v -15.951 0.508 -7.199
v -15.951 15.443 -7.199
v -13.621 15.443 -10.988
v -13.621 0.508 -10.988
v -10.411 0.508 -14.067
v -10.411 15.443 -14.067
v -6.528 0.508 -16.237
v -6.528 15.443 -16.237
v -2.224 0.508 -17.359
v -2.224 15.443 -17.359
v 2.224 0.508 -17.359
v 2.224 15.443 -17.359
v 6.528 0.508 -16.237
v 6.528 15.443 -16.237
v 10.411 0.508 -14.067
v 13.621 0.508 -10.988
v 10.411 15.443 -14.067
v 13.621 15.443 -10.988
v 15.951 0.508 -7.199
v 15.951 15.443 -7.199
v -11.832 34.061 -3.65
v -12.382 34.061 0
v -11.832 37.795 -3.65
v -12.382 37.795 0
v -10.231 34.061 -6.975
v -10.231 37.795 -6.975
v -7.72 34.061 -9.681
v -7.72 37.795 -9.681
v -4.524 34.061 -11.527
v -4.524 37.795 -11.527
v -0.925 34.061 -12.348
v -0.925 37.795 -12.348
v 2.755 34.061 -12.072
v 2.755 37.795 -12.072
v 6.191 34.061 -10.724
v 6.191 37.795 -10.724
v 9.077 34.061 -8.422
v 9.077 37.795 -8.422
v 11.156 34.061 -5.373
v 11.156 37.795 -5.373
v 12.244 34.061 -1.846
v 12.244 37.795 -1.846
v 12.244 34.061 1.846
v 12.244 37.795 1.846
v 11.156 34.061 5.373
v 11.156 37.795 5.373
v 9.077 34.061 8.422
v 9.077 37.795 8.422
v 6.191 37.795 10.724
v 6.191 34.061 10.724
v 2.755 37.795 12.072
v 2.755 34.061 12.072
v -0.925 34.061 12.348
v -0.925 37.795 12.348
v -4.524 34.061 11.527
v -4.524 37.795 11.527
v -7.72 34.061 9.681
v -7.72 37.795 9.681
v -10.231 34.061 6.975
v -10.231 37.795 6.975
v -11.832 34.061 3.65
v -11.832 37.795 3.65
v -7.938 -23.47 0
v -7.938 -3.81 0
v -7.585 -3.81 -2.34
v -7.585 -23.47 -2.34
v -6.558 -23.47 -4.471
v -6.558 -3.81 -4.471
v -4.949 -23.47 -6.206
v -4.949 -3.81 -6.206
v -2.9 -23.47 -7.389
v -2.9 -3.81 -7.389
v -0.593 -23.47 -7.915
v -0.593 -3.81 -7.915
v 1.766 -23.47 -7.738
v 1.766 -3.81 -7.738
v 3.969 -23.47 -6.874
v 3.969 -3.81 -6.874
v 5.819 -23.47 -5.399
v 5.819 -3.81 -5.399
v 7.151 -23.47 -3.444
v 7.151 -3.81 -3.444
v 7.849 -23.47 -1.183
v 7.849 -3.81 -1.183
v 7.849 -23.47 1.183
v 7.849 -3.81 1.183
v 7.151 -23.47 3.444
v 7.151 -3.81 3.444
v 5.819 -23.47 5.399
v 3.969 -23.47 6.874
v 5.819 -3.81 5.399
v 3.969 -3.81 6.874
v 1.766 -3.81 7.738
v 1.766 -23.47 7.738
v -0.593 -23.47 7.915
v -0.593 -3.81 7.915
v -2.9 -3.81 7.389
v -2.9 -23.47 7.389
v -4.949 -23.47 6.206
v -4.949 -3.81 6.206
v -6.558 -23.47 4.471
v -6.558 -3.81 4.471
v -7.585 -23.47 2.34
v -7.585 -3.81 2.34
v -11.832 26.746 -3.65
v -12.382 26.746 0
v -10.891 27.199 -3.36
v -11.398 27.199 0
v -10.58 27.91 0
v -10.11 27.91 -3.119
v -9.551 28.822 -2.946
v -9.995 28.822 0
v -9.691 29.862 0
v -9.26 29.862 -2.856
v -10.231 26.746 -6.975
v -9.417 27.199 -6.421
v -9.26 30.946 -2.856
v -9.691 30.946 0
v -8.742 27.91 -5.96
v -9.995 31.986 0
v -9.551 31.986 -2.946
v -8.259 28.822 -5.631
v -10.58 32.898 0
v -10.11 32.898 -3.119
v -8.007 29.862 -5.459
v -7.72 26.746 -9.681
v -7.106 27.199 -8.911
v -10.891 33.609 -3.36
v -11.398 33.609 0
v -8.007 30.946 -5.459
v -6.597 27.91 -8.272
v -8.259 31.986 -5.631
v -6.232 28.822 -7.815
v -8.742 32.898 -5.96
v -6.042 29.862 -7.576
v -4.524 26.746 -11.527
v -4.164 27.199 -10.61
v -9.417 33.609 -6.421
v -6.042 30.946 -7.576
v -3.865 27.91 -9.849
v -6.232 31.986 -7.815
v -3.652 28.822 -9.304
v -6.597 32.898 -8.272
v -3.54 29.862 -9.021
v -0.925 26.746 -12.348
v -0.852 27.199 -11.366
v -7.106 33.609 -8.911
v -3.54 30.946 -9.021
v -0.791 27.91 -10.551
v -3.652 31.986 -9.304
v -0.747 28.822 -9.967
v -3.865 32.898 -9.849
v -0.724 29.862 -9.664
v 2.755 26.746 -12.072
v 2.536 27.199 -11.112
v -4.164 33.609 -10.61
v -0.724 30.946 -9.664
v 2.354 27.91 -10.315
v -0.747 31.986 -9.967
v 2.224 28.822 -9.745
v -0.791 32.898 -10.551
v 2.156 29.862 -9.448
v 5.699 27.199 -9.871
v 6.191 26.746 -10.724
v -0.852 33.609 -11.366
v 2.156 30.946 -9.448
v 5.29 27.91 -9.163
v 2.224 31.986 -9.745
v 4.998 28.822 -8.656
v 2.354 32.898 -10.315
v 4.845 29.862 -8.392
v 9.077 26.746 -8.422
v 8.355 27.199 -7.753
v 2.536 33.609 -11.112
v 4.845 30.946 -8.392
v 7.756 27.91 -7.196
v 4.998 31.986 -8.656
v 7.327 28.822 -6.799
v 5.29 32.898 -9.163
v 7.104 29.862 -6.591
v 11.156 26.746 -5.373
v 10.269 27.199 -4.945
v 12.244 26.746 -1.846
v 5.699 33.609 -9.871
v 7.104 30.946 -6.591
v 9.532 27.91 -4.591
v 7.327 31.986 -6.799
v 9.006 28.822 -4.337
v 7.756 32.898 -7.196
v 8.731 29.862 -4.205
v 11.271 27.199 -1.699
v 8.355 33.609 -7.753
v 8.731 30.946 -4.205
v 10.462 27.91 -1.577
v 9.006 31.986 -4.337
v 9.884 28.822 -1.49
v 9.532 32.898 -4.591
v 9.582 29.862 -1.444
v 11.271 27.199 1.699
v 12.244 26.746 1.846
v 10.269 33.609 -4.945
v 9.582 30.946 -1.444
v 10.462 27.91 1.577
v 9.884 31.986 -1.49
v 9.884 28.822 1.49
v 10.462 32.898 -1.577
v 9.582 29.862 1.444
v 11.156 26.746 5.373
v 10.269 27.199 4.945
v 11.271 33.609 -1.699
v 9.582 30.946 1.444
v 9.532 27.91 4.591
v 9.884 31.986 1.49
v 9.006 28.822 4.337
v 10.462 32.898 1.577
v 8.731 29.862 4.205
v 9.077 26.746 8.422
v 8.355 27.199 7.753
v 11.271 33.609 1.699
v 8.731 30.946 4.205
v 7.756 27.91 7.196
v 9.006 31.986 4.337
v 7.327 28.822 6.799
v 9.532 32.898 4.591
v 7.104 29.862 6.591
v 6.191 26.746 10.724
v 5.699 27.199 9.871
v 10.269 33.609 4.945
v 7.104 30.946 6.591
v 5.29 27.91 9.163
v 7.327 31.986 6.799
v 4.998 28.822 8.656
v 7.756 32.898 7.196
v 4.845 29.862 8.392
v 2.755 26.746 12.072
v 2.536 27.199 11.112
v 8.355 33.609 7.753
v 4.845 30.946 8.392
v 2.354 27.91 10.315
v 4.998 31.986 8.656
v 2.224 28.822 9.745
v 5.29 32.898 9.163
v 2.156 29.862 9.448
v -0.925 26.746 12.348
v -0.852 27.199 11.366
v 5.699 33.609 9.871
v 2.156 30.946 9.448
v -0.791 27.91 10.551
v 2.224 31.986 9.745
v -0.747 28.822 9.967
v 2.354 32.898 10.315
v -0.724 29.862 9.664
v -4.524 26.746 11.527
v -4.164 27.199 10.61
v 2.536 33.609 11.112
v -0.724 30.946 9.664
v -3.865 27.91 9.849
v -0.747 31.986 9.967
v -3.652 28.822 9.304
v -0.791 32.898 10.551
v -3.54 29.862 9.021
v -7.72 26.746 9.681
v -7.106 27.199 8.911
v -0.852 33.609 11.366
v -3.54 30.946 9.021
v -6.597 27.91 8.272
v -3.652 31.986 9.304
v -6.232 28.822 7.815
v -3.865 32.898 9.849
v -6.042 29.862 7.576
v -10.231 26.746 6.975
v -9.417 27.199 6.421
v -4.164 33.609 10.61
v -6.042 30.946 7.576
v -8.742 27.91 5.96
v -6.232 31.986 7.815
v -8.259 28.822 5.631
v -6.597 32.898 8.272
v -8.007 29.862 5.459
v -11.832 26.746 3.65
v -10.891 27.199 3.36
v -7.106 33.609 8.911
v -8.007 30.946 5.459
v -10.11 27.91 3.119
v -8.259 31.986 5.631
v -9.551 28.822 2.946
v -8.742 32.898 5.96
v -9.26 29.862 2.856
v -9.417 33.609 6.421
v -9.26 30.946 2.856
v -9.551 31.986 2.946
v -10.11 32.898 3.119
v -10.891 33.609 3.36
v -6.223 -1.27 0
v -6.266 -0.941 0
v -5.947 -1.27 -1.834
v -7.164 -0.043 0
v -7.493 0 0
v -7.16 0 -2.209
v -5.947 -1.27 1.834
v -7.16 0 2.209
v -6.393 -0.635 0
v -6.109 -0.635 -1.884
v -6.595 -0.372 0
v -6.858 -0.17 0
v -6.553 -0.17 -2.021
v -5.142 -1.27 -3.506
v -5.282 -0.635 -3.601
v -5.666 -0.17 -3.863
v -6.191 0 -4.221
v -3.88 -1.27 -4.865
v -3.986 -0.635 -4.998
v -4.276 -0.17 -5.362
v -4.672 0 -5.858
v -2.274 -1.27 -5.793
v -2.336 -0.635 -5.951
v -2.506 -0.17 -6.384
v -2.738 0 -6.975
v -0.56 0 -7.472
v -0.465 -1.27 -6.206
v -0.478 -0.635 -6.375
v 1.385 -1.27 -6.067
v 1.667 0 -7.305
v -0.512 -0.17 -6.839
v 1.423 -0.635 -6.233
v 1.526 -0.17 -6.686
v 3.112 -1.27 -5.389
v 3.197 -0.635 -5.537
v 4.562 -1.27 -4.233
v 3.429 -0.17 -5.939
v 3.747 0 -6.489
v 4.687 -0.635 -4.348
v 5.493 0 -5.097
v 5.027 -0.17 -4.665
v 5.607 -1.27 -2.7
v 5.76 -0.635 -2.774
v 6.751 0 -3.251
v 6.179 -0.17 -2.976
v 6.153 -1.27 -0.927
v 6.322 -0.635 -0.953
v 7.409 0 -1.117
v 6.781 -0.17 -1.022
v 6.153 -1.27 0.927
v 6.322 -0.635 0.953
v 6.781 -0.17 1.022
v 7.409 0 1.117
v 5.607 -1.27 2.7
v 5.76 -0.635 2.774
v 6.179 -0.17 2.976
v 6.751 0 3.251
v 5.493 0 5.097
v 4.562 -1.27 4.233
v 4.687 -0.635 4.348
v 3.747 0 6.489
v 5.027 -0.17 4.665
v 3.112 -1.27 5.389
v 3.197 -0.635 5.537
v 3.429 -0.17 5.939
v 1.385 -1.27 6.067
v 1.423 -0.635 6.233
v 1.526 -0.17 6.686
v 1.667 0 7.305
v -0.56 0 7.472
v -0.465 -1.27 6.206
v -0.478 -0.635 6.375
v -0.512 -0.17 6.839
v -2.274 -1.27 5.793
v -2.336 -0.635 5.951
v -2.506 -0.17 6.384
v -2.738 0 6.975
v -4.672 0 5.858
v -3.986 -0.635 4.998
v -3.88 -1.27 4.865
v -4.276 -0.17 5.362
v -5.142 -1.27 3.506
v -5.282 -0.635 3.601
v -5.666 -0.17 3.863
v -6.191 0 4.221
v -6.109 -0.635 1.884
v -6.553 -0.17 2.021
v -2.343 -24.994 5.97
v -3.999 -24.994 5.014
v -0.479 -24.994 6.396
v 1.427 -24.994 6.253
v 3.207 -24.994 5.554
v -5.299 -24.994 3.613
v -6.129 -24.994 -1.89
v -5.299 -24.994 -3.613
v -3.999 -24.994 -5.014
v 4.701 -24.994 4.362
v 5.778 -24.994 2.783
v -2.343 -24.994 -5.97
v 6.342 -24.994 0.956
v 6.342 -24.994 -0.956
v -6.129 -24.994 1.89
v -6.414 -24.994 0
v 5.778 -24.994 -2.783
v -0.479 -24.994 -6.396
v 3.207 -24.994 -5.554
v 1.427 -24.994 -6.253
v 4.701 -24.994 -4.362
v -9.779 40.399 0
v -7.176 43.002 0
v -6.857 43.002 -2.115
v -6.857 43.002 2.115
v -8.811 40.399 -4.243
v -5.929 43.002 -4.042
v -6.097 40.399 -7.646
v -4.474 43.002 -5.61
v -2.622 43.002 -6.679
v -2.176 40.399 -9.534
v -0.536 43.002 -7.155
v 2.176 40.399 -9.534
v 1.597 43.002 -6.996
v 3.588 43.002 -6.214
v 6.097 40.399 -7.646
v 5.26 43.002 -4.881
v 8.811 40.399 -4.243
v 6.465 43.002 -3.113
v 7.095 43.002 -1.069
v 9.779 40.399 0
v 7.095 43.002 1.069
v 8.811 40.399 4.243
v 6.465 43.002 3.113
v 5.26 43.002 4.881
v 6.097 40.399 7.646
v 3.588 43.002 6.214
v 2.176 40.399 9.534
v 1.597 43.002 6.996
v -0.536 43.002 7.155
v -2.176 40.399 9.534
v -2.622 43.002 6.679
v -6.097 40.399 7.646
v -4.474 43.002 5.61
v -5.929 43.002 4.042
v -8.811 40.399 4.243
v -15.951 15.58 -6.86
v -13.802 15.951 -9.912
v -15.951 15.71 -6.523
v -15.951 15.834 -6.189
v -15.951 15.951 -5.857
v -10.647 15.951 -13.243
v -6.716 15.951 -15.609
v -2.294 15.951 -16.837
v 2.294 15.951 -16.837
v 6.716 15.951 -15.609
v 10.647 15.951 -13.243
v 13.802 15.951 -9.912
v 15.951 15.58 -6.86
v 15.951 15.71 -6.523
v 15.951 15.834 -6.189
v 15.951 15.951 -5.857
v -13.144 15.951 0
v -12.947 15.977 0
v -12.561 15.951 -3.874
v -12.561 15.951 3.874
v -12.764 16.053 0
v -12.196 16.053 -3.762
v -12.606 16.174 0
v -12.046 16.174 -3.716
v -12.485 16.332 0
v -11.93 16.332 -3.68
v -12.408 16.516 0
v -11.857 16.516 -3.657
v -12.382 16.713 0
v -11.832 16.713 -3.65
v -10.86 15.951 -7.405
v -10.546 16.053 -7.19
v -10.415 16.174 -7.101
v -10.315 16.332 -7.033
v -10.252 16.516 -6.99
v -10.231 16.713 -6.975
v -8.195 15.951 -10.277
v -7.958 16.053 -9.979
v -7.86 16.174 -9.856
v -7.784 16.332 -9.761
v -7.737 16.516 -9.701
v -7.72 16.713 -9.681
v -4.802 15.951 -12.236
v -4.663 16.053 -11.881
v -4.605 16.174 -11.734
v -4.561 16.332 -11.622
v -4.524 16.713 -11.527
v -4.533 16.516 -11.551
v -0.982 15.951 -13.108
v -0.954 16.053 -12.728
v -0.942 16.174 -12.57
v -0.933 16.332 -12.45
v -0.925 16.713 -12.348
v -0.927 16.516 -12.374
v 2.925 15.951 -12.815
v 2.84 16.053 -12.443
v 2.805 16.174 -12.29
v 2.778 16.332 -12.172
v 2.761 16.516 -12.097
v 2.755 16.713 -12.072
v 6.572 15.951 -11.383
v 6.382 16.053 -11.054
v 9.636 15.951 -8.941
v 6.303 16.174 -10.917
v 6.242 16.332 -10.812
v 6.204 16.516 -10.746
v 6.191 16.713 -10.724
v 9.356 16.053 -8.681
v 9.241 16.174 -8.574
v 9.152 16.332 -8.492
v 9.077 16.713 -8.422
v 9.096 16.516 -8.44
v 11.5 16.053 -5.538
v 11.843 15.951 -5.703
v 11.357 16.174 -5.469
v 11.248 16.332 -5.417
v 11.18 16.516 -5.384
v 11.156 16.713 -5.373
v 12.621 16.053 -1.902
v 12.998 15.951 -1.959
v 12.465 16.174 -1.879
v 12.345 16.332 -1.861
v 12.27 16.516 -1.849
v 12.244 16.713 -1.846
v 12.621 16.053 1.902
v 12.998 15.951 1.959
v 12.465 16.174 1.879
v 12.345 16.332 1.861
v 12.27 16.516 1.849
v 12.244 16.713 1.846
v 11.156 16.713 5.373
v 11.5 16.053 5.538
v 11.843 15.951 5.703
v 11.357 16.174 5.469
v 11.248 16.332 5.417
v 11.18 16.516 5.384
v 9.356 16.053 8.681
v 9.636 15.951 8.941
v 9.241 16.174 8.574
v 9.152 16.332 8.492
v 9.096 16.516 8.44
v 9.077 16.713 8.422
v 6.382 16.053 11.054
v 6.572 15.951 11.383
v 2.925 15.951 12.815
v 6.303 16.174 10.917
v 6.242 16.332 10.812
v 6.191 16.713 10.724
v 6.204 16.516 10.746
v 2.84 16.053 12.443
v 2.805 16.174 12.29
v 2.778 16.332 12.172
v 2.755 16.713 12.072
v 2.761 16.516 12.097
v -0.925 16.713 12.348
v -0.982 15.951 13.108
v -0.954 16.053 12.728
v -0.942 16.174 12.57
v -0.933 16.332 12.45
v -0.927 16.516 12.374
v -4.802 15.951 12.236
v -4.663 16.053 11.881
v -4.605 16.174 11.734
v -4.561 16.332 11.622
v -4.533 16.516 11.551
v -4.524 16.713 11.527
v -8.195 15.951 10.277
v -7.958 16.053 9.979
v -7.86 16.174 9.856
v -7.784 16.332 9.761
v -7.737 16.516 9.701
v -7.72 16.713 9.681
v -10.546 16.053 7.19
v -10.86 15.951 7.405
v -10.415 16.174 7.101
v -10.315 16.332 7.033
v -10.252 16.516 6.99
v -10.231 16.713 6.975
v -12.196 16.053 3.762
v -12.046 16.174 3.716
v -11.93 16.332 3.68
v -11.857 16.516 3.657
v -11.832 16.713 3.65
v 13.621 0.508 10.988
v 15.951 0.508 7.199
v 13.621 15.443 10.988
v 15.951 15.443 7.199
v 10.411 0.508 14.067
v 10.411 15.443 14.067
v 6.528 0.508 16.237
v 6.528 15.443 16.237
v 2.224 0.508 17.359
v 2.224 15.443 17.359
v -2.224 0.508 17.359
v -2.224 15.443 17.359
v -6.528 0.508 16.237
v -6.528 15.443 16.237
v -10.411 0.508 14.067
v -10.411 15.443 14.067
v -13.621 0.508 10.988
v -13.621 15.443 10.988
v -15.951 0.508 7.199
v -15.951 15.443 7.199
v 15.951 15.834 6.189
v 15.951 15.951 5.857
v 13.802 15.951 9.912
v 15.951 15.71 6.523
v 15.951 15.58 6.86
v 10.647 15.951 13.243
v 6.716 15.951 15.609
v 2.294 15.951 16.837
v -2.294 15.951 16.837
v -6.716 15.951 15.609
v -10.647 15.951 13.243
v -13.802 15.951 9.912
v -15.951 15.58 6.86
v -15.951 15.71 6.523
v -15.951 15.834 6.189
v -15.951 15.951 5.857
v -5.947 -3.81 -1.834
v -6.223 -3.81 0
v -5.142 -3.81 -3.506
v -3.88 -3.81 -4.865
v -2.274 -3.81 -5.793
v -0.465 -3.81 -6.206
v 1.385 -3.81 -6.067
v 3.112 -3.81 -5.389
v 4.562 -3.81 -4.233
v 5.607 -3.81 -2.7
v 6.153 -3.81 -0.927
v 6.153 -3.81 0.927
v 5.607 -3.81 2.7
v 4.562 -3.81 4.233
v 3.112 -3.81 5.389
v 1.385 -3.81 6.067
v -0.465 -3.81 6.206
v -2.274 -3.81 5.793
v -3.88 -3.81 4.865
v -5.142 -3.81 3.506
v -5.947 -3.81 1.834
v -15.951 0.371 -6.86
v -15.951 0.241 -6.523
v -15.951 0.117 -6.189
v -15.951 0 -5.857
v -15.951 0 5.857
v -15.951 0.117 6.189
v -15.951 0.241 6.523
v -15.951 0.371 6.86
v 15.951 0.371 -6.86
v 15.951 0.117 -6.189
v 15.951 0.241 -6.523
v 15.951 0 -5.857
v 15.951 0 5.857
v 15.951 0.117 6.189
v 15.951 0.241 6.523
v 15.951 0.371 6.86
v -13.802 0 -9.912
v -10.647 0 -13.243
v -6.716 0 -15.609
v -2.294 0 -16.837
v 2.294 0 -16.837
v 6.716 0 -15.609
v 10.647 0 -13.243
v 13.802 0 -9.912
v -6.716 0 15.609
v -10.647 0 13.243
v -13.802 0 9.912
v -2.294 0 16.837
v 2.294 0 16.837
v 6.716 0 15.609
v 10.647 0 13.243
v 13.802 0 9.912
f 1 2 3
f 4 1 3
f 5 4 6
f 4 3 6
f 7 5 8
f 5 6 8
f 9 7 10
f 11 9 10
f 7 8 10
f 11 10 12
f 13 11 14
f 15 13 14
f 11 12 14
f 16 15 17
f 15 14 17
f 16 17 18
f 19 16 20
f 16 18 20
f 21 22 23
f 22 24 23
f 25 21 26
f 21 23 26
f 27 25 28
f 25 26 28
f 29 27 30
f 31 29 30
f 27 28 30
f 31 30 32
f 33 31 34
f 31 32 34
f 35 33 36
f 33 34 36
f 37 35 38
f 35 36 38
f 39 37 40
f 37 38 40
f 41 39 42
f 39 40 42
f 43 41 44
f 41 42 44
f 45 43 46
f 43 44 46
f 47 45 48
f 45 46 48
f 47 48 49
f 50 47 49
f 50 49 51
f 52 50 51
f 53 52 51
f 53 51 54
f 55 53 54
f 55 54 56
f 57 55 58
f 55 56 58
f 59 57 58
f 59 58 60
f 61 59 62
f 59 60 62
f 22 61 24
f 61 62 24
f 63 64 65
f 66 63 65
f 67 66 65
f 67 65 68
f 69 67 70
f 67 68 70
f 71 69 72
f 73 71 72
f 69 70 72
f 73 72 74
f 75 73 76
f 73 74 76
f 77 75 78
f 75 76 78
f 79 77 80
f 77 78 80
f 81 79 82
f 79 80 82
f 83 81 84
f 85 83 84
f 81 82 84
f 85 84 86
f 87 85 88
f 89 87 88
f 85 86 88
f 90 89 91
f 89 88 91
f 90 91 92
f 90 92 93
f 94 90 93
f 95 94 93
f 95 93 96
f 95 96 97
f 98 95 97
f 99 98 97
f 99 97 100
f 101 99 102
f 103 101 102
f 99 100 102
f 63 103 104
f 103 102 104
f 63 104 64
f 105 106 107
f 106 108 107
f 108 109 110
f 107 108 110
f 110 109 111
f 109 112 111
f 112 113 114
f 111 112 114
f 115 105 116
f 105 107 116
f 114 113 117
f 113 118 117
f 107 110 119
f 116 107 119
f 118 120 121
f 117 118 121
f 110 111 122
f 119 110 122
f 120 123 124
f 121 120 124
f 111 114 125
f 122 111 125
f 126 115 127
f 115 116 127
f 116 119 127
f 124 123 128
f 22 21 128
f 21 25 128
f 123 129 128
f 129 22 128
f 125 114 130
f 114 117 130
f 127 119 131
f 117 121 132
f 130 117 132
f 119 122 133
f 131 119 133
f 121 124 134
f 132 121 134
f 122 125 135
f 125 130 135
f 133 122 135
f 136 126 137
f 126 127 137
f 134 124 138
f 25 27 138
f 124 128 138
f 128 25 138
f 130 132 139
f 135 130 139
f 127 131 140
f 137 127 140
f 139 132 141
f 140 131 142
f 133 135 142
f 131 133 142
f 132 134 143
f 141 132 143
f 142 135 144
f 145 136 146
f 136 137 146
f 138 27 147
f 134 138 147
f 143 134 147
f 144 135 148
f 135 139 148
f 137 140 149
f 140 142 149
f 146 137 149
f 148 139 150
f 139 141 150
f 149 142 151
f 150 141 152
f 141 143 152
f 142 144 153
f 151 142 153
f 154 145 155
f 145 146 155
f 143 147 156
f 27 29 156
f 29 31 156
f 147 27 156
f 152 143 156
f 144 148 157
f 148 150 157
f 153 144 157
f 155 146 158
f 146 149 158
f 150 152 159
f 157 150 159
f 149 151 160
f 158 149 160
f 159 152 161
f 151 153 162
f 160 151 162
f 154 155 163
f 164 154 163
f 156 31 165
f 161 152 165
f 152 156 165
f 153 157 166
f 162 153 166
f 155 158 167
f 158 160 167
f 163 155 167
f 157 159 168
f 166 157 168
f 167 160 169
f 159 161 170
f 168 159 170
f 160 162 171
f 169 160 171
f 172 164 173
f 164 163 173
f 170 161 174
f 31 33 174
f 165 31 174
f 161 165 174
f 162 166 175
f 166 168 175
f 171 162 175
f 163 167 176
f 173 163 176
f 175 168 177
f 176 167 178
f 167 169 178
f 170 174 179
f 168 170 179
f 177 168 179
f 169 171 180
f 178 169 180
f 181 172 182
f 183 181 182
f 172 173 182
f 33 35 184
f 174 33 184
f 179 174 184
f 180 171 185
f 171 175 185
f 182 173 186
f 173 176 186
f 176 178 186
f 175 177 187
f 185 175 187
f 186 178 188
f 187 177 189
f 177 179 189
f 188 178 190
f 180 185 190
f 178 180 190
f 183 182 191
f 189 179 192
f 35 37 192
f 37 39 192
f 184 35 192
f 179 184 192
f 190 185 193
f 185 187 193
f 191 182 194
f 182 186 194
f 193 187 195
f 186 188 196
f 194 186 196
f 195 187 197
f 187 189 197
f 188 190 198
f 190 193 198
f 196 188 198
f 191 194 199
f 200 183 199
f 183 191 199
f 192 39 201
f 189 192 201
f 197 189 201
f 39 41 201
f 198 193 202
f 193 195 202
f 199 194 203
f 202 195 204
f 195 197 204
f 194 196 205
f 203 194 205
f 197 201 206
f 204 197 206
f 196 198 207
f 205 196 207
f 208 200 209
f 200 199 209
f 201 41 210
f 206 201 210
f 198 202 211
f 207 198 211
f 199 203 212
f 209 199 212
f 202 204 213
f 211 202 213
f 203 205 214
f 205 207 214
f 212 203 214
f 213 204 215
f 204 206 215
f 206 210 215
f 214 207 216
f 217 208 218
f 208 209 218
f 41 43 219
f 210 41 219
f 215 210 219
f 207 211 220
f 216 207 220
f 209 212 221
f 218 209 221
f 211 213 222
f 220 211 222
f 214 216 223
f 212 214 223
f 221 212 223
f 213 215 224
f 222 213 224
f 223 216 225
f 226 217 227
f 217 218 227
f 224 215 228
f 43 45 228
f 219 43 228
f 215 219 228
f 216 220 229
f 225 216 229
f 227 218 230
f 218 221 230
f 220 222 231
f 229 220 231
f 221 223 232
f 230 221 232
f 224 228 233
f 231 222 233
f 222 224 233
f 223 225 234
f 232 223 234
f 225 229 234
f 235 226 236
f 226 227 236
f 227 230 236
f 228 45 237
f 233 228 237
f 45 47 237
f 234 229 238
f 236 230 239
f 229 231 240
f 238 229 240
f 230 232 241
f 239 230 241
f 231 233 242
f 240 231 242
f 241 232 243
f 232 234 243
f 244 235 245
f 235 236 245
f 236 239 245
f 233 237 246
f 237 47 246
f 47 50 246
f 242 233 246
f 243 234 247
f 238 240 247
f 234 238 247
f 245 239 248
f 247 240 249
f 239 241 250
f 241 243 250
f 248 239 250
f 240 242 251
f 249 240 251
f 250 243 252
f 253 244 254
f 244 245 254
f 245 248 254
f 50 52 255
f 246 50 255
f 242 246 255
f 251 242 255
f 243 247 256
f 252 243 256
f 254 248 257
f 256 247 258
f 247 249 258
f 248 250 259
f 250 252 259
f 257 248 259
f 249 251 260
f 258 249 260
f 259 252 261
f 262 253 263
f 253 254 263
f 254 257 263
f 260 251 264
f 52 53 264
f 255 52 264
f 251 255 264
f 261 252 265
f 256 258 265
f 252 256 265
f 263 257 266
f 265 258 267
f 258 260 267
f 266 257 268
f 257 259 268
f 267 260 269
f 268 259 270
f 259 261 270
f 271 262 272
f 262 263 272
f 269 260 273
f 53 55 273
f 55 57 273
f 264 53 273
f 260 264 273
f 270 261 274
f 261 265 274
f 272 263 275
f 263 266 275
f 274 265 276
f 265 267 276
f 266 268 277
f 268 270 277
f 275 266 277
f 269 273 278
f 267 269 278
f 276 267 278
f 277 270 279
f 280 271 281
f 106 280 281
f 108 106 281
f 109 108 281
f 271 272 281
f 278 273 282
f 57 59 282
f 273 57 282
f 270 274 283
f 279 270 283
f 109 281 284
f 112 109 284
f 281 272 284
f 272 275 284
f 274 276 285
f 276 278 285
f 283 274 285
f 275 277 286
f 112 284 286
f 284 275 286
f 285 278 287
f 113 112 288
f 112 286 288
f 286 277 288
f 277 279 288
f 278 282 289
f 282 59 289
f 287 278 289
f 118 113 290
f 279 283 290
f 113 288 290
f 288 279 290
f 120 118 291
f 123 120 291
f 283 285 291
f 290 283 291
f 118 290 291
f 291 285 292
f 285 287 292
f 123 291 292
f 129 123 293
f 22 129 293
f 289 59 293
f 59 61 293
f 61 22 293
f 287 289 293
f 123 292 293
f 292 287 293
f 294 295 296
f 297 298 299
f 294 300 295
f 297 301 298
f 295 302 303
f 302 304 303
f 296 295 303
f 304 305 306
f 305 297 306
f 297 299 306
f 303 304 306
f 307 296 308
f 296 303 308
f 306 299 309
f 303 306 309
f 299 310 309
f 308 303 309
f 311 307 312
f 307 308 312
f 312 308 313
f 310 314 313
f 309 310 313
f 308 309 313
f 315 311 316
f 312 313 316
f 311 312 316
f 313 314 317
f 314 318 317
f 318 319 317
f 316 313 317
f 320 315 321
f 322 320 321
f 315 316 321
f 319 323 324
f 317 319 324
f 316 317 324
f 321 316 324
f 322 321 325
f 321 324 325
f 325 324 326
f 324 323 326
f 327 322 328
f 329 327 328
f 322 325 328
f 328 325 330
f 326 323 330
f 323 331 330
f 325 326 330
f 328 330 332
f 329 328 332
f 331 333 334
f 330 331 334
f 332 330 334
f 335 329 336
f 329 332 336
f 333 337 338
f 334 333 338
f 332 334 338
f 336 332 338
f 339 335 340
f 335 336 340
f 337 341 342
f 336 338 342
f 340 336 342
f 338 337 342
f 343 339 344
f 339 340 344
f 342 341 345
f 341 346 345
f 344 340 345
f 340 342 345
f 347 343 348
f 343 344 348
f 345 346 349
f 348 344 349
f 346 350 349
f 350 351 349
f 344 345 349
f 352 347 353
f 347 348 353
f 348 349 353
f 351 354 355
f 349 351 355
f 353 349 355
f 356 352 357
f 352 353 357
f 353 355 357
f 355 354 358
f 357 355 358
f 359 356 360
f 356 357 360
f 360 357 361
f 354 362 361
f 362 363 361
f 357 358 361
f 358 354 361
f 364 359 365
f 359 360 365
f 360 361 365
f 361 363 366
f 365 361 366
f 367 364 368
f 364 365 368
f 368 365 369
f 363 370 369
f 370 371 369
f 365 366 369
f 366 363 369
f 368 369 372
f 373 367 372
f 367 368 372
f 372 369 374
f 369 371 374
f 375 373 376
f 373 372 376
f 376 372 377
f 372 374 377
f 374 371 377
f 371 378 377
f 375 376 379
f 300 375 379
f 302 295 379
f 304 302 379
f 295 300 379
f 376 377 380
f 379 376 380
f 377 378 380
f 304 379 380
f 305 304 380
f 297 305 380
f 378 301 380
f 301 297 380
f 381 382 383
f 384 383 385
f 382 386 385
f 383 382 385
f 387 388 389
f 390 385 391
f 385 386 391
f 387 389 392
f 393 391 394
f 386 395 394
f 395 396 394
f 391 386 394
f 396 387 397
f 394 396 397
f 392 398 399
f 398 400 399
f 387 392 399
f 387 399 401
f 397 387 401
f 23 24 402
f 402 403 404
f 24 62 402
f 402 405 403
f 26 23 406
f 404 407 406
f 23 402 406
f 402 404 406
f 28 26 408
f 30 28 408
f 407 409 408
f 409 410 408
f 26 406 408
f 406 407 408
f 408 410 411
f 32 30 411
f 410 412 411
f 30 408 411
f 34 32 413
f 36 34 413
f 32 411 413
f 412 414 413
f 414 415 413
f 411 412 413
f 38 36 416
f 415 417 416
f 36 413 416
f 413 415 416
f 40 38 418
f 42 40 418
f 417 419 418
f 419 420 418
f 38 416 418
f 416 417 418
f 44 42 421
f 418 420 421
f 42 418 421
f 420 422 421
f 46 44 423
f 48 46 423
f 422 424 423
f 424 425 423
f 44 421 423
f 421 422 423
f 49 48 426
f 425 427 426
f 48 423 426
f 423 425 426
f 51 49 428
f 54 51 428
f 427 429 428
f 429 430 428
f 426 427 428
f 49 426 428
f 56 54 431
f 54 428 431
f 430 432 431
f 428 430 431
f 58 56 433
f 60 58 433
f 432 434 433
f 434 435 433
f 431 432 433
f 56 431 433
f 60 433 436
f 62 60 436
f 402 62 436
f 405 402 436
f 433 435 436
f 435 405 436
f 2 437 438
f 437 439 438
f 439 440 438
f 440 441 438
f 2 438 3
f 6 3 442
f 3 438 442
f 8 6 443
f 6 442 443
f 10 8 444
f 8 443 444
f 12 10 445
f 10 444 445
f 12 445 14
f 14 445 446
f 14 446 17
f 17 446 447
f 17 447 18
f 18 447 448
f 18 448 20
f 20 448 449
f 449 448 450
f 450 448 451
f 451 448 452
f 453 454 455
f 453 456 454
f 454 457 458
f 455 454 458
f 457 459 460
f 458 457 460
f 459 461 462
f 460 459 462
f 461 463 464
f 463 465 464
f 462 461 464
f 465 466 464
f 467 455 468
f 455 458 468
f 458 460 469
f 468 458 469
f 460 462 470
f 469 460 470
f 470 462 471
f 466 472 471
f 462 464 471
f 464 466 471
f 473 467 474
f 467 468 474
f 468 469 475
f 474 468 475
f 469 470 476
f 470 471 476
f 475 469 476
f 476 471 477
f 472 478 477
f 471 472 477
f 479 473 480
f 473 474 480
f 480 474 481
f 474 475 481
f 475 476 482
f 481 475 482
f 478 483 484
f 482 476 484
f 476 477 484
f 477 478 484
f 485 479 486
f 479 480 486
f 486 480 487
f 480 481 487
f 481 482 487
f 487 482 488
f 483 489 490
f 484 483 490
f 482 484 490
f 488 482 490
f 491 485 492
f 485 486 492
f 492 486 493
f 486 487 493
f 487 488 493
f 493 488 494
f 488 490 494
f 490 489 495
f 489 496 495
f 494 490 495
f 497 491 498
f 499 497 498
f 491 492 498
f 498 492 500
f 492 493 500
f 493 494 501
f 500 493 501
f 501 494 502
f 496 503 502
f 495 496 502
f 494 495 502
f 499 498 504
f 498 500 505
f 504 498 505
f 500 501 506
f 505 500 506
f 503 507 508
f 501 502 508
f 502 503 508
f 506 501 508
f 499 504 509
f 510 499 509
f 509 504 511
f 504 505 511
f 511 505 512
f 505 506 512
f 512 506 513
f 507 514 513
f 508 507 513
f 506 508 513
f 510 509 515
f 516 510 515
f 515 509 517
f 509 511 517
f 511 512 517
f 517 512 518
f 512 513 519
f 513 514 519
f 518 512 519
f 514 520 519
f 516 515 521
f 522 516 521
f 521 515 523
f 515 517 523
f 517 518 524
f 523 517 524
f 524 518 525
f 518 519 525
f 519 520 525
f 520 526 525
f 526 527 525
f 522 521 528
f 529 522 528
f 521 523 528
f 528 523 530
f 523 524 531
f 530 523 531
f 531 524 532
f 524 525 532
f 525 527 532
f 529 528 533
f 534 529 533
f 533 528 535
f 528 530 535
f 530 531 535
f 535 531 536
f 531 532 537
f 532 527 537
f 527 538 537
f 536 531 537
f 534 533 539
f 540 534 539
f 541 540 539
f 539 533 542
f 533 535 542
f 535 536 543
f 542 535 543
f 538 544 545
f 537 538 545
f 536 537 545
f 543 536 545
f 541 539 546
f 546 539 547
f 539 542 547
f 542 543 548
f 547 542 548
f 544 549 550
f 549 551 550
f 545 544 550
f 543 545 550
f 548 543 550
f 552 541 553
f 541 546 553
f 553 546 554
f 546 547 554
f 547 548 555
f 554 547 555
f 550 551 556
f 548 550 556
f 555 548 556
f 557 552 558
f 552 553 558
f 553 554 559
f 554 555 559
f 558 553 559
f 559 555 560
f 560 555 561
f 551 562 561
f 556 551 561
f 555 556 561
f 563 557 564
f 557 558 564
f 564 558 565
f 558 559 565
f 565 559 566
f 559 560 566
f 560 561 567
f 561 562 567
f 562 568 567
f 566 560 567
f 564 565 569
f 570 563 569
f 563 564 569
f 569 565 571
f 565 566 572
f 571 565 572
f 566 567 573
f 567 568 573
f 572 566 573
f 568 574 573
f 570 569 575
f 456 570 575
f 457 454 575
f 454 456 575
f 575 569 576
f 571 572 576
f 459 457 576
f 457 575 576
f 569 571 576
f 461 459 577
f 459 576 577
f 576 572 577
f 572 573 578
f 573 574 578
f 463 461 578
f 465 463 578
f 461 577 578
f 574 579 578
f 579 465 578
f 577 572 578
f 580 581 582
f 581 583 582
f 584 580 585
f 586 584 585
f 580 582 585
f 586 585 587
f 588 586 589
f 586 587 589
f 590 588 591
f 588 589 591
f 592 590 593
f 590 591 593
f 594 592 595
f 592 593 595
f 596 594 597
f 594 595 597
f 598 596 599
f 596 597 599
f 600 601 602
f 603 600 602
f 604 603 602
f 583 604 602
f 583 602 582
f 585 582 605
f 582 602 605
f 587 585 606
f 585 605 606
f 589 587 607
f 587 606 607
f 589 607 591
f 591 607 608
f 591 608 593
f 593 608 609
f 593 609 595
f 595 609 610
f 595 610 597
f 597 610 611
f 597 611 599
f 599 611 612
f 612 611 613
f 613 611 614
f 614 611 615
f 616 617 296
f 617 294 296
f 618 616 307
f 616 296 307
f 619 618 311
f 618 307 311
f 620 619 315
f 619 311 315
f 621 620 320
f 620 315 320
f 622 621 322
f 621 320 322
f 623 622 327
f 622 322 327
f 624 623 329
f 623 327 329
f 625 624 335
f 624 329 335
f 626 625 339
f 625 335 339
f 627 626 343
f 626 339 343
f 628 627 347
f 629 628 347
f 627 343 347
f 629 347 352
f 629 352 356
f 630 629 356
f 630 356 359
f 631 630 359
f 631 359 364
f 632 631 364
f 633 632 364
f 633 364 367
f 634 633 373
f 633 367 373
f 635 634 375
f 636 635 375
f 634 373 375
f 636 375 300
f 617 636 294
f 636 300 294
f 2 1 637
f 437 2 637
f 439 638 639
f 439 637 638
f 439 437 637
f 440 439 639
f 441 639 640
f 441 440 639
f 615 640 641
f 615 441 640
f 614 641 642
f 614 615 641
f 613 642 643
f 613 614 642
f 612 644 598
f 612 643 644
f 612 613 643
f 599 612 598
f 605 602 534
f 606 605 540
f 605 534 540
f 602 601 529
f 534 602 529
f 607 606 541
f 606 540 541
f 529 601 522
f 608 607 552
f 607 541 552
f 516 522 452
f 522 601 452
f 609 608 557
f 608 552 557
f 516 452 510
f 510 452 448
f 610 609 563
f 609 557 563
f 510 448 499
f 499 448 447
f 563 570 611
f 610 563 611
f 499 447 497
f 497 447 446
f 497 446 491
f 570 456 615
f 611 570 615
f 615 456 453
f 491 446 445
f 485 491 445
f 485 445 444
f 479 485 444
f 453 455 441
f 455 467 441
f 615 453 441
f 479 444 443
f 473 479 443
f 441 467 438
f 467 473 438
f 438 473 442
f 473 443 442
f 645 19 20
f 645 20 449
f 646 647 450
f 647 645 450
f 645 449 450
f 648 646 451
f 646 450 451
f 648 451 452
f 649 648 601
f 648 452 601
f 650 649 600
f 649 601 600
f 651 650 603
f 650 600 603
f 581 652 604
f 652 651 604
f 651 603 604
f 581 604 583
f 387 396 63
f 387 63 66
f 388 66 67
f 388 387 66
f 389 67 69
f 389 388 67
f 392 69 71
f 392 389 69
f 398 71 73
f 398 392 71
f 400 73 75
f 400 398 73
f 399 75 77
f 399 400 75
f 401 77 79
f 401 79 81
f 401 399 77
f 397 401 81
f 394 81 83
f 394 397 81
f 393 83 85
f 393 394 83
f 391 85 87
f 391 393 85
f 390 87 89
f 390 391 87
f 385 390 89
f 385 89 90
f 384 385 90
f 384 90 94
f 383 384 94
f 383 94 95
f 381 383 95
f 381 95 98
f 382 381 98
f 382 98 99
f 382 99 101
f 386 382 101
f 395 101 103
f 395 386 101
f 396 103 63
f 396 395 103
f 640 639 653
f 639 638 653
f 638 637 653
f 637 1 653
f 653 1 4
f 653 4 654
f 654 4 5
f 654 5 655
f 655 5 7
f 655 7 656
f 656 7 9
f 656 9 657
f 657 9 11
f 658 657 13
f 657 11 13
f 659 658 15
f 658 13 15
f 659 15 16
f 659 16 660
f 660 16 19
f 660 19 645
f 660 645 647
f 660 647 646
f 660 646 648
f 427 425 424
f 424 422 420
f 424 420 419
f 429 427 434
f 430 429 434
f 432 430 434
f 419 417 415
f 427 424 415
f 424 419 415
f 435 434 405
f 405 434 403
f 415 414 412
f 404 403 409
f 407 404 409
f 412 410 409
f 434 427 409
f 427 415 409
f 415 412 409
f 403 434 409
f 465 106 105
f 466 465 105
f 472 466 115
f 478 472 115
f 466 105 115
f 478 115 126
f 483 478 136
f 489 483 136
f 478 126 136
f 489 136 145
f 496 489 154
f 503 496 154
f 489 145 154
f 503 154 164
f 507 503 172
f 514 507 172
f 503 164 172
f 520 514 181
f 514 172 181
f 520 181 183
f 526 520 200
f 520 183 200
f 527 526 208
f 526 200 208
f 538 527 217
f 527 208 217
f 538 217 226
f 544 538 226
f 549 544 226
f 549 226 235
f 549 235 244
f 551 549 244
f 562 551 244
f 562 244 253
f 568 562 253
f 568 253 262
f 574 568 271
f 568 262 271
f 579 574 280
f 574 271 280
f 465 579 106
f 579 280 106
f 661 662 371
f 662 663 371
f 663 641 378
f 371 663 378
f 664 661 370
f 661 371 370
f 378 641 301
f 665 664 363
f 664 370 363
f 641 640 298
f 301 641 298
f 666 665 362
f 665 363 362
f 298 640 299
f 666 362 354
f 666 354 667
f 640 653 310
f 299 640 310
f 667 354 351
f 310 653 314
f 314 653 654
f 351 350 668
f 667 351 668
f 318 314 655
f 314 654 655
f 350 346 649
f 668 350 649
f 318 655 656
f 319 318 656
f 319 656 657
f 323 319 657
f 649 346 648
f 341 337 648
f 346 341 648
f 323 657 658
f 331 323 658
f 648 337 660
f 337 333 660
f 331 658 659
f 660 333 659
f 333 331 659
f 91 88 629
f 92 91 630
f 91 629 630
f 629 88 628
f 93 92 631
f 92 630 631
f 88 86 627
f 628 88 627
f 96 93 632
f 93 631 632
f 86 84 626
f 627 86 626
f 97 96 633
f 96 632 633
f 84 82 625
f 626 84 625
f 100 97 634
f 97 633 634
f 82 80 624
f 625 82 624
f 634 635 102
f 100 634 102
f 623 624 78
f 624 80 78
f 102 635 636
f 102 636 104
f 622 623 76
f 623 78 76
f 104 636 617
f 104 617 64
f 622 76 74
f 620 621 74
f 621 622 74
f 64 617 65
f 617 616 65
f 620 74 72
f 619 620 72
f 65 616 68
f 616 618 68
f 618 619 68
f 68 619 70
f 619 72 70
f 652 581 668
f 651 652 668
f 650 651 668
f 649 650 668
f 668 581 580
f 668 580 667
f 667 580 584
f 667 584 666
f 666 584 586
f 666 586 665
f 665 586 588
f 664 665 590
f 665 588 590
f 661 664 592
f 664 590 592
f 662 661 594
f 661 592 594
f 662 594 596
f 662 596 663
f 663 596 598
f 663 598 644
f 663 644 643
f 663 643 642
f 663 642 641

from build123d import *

# Parameters (mm, degrees)
CHAMFER1_SIZE      = 0.508
CHAMFER2_SIZE      = 1.524
CUT_EXTRUDE1_DEPTH = 41.9448
FILLET1_R          = 0.762


with BuildPart() as part:
    # Sketch1 → Revolve1 (revolve)
    with BuildSketch(Plane.XY):
        with BuildLine():
            Line((0, 43.0022), (0, -24.9936))
            Line((0, -24.9936), (-7.9375, -24.9936))
            Line((-7.9375, -24.9936), (-7.9375, -3.81))
            Line((-7.9375, -3.81), (-6.223, -3.81))
            Line((-6.223, -3.81), (-6.223, -1.27))
            ThreePointArc((-6.223, -1.27), (-6.594974388, -0.371974388), (-7.493, 0))
            Line((-7.493, 0), (-17.5006, 0))
            Line((-17.5006, 0), (-17.5006, 15.9512))
            Line((-17.5006, 15.9512), (-12.3825, 15.9512))
            Line((-12.3825, 15.9512), (-12.3825, 26.7462))
            ThreePointArc((-12.3825, 26.7462), (-9.652, 30.4038), (-12.3825, 34.0614))
            Line((-12.3825, 34.0614), (-12.3825, 37.7952))
            Line((-12.3825, 37.7952), (-7.1755, 43.0022))
            Line((-7.1755, 43.0022), (0, 43.0022))
        make_face()
    revolve(axis=Axis((0, -24.9936, 0), (0, -1, 0)))

    # Chamfer1
    chamfer1_edges = [part.edges().sort_by_distance(p)[0] for p in [
        (17.5006, 15.9512, 0),
        (17.5006, 0, 0),
    ]]
    chamfer(chamfer1_edges, length=CHAMFER1_SIZE)

    # Chamfer2
    chamfer2_edges = [part.edges().sort_by_distance(p)[0] for p in [
        (7.9375, -24.9936, 0),
    ]]
    chamfer(chamfer2_edges, length=CHAMFER2_SIZE)

    # Sketch2 → Cut-Extrude1 (cut, through all)
    with BuildSketch(Plane(origin=(0, 15.9512, 0), x_dir=(1, 0, 0), z_dir=(0, 1, 0))):
        with BuildLine():
            Line((-15.9512, 7.199320726), (-15.9512, -7.199320726))
            ThreePointArc((-15.9512, -7.199320726), (-17.5006, 0), (-15.9512, 7.199320726))
        make_face()
        with BuildLine():
            Line((15.9512, 7.199320726), (15.9512, -7.199320726))
            ThreePointArc((15.9512, -7.199320726), (17.5006, 0), (15.9512, 7.199320726))
        make_face()
    extrude(amount=-CUT_EXTRUDE1_DEPTH, mode=Mode.SUBTRACT)

    # Fillet1
    fillet1_edges = [part.edges().sort_by_distance(p)[0] for p in [
        (12.3825, 15.9512, 0),
    ]]
    fillet(fillet1_edges, radius=FILLET1_R)


solid = part.part
